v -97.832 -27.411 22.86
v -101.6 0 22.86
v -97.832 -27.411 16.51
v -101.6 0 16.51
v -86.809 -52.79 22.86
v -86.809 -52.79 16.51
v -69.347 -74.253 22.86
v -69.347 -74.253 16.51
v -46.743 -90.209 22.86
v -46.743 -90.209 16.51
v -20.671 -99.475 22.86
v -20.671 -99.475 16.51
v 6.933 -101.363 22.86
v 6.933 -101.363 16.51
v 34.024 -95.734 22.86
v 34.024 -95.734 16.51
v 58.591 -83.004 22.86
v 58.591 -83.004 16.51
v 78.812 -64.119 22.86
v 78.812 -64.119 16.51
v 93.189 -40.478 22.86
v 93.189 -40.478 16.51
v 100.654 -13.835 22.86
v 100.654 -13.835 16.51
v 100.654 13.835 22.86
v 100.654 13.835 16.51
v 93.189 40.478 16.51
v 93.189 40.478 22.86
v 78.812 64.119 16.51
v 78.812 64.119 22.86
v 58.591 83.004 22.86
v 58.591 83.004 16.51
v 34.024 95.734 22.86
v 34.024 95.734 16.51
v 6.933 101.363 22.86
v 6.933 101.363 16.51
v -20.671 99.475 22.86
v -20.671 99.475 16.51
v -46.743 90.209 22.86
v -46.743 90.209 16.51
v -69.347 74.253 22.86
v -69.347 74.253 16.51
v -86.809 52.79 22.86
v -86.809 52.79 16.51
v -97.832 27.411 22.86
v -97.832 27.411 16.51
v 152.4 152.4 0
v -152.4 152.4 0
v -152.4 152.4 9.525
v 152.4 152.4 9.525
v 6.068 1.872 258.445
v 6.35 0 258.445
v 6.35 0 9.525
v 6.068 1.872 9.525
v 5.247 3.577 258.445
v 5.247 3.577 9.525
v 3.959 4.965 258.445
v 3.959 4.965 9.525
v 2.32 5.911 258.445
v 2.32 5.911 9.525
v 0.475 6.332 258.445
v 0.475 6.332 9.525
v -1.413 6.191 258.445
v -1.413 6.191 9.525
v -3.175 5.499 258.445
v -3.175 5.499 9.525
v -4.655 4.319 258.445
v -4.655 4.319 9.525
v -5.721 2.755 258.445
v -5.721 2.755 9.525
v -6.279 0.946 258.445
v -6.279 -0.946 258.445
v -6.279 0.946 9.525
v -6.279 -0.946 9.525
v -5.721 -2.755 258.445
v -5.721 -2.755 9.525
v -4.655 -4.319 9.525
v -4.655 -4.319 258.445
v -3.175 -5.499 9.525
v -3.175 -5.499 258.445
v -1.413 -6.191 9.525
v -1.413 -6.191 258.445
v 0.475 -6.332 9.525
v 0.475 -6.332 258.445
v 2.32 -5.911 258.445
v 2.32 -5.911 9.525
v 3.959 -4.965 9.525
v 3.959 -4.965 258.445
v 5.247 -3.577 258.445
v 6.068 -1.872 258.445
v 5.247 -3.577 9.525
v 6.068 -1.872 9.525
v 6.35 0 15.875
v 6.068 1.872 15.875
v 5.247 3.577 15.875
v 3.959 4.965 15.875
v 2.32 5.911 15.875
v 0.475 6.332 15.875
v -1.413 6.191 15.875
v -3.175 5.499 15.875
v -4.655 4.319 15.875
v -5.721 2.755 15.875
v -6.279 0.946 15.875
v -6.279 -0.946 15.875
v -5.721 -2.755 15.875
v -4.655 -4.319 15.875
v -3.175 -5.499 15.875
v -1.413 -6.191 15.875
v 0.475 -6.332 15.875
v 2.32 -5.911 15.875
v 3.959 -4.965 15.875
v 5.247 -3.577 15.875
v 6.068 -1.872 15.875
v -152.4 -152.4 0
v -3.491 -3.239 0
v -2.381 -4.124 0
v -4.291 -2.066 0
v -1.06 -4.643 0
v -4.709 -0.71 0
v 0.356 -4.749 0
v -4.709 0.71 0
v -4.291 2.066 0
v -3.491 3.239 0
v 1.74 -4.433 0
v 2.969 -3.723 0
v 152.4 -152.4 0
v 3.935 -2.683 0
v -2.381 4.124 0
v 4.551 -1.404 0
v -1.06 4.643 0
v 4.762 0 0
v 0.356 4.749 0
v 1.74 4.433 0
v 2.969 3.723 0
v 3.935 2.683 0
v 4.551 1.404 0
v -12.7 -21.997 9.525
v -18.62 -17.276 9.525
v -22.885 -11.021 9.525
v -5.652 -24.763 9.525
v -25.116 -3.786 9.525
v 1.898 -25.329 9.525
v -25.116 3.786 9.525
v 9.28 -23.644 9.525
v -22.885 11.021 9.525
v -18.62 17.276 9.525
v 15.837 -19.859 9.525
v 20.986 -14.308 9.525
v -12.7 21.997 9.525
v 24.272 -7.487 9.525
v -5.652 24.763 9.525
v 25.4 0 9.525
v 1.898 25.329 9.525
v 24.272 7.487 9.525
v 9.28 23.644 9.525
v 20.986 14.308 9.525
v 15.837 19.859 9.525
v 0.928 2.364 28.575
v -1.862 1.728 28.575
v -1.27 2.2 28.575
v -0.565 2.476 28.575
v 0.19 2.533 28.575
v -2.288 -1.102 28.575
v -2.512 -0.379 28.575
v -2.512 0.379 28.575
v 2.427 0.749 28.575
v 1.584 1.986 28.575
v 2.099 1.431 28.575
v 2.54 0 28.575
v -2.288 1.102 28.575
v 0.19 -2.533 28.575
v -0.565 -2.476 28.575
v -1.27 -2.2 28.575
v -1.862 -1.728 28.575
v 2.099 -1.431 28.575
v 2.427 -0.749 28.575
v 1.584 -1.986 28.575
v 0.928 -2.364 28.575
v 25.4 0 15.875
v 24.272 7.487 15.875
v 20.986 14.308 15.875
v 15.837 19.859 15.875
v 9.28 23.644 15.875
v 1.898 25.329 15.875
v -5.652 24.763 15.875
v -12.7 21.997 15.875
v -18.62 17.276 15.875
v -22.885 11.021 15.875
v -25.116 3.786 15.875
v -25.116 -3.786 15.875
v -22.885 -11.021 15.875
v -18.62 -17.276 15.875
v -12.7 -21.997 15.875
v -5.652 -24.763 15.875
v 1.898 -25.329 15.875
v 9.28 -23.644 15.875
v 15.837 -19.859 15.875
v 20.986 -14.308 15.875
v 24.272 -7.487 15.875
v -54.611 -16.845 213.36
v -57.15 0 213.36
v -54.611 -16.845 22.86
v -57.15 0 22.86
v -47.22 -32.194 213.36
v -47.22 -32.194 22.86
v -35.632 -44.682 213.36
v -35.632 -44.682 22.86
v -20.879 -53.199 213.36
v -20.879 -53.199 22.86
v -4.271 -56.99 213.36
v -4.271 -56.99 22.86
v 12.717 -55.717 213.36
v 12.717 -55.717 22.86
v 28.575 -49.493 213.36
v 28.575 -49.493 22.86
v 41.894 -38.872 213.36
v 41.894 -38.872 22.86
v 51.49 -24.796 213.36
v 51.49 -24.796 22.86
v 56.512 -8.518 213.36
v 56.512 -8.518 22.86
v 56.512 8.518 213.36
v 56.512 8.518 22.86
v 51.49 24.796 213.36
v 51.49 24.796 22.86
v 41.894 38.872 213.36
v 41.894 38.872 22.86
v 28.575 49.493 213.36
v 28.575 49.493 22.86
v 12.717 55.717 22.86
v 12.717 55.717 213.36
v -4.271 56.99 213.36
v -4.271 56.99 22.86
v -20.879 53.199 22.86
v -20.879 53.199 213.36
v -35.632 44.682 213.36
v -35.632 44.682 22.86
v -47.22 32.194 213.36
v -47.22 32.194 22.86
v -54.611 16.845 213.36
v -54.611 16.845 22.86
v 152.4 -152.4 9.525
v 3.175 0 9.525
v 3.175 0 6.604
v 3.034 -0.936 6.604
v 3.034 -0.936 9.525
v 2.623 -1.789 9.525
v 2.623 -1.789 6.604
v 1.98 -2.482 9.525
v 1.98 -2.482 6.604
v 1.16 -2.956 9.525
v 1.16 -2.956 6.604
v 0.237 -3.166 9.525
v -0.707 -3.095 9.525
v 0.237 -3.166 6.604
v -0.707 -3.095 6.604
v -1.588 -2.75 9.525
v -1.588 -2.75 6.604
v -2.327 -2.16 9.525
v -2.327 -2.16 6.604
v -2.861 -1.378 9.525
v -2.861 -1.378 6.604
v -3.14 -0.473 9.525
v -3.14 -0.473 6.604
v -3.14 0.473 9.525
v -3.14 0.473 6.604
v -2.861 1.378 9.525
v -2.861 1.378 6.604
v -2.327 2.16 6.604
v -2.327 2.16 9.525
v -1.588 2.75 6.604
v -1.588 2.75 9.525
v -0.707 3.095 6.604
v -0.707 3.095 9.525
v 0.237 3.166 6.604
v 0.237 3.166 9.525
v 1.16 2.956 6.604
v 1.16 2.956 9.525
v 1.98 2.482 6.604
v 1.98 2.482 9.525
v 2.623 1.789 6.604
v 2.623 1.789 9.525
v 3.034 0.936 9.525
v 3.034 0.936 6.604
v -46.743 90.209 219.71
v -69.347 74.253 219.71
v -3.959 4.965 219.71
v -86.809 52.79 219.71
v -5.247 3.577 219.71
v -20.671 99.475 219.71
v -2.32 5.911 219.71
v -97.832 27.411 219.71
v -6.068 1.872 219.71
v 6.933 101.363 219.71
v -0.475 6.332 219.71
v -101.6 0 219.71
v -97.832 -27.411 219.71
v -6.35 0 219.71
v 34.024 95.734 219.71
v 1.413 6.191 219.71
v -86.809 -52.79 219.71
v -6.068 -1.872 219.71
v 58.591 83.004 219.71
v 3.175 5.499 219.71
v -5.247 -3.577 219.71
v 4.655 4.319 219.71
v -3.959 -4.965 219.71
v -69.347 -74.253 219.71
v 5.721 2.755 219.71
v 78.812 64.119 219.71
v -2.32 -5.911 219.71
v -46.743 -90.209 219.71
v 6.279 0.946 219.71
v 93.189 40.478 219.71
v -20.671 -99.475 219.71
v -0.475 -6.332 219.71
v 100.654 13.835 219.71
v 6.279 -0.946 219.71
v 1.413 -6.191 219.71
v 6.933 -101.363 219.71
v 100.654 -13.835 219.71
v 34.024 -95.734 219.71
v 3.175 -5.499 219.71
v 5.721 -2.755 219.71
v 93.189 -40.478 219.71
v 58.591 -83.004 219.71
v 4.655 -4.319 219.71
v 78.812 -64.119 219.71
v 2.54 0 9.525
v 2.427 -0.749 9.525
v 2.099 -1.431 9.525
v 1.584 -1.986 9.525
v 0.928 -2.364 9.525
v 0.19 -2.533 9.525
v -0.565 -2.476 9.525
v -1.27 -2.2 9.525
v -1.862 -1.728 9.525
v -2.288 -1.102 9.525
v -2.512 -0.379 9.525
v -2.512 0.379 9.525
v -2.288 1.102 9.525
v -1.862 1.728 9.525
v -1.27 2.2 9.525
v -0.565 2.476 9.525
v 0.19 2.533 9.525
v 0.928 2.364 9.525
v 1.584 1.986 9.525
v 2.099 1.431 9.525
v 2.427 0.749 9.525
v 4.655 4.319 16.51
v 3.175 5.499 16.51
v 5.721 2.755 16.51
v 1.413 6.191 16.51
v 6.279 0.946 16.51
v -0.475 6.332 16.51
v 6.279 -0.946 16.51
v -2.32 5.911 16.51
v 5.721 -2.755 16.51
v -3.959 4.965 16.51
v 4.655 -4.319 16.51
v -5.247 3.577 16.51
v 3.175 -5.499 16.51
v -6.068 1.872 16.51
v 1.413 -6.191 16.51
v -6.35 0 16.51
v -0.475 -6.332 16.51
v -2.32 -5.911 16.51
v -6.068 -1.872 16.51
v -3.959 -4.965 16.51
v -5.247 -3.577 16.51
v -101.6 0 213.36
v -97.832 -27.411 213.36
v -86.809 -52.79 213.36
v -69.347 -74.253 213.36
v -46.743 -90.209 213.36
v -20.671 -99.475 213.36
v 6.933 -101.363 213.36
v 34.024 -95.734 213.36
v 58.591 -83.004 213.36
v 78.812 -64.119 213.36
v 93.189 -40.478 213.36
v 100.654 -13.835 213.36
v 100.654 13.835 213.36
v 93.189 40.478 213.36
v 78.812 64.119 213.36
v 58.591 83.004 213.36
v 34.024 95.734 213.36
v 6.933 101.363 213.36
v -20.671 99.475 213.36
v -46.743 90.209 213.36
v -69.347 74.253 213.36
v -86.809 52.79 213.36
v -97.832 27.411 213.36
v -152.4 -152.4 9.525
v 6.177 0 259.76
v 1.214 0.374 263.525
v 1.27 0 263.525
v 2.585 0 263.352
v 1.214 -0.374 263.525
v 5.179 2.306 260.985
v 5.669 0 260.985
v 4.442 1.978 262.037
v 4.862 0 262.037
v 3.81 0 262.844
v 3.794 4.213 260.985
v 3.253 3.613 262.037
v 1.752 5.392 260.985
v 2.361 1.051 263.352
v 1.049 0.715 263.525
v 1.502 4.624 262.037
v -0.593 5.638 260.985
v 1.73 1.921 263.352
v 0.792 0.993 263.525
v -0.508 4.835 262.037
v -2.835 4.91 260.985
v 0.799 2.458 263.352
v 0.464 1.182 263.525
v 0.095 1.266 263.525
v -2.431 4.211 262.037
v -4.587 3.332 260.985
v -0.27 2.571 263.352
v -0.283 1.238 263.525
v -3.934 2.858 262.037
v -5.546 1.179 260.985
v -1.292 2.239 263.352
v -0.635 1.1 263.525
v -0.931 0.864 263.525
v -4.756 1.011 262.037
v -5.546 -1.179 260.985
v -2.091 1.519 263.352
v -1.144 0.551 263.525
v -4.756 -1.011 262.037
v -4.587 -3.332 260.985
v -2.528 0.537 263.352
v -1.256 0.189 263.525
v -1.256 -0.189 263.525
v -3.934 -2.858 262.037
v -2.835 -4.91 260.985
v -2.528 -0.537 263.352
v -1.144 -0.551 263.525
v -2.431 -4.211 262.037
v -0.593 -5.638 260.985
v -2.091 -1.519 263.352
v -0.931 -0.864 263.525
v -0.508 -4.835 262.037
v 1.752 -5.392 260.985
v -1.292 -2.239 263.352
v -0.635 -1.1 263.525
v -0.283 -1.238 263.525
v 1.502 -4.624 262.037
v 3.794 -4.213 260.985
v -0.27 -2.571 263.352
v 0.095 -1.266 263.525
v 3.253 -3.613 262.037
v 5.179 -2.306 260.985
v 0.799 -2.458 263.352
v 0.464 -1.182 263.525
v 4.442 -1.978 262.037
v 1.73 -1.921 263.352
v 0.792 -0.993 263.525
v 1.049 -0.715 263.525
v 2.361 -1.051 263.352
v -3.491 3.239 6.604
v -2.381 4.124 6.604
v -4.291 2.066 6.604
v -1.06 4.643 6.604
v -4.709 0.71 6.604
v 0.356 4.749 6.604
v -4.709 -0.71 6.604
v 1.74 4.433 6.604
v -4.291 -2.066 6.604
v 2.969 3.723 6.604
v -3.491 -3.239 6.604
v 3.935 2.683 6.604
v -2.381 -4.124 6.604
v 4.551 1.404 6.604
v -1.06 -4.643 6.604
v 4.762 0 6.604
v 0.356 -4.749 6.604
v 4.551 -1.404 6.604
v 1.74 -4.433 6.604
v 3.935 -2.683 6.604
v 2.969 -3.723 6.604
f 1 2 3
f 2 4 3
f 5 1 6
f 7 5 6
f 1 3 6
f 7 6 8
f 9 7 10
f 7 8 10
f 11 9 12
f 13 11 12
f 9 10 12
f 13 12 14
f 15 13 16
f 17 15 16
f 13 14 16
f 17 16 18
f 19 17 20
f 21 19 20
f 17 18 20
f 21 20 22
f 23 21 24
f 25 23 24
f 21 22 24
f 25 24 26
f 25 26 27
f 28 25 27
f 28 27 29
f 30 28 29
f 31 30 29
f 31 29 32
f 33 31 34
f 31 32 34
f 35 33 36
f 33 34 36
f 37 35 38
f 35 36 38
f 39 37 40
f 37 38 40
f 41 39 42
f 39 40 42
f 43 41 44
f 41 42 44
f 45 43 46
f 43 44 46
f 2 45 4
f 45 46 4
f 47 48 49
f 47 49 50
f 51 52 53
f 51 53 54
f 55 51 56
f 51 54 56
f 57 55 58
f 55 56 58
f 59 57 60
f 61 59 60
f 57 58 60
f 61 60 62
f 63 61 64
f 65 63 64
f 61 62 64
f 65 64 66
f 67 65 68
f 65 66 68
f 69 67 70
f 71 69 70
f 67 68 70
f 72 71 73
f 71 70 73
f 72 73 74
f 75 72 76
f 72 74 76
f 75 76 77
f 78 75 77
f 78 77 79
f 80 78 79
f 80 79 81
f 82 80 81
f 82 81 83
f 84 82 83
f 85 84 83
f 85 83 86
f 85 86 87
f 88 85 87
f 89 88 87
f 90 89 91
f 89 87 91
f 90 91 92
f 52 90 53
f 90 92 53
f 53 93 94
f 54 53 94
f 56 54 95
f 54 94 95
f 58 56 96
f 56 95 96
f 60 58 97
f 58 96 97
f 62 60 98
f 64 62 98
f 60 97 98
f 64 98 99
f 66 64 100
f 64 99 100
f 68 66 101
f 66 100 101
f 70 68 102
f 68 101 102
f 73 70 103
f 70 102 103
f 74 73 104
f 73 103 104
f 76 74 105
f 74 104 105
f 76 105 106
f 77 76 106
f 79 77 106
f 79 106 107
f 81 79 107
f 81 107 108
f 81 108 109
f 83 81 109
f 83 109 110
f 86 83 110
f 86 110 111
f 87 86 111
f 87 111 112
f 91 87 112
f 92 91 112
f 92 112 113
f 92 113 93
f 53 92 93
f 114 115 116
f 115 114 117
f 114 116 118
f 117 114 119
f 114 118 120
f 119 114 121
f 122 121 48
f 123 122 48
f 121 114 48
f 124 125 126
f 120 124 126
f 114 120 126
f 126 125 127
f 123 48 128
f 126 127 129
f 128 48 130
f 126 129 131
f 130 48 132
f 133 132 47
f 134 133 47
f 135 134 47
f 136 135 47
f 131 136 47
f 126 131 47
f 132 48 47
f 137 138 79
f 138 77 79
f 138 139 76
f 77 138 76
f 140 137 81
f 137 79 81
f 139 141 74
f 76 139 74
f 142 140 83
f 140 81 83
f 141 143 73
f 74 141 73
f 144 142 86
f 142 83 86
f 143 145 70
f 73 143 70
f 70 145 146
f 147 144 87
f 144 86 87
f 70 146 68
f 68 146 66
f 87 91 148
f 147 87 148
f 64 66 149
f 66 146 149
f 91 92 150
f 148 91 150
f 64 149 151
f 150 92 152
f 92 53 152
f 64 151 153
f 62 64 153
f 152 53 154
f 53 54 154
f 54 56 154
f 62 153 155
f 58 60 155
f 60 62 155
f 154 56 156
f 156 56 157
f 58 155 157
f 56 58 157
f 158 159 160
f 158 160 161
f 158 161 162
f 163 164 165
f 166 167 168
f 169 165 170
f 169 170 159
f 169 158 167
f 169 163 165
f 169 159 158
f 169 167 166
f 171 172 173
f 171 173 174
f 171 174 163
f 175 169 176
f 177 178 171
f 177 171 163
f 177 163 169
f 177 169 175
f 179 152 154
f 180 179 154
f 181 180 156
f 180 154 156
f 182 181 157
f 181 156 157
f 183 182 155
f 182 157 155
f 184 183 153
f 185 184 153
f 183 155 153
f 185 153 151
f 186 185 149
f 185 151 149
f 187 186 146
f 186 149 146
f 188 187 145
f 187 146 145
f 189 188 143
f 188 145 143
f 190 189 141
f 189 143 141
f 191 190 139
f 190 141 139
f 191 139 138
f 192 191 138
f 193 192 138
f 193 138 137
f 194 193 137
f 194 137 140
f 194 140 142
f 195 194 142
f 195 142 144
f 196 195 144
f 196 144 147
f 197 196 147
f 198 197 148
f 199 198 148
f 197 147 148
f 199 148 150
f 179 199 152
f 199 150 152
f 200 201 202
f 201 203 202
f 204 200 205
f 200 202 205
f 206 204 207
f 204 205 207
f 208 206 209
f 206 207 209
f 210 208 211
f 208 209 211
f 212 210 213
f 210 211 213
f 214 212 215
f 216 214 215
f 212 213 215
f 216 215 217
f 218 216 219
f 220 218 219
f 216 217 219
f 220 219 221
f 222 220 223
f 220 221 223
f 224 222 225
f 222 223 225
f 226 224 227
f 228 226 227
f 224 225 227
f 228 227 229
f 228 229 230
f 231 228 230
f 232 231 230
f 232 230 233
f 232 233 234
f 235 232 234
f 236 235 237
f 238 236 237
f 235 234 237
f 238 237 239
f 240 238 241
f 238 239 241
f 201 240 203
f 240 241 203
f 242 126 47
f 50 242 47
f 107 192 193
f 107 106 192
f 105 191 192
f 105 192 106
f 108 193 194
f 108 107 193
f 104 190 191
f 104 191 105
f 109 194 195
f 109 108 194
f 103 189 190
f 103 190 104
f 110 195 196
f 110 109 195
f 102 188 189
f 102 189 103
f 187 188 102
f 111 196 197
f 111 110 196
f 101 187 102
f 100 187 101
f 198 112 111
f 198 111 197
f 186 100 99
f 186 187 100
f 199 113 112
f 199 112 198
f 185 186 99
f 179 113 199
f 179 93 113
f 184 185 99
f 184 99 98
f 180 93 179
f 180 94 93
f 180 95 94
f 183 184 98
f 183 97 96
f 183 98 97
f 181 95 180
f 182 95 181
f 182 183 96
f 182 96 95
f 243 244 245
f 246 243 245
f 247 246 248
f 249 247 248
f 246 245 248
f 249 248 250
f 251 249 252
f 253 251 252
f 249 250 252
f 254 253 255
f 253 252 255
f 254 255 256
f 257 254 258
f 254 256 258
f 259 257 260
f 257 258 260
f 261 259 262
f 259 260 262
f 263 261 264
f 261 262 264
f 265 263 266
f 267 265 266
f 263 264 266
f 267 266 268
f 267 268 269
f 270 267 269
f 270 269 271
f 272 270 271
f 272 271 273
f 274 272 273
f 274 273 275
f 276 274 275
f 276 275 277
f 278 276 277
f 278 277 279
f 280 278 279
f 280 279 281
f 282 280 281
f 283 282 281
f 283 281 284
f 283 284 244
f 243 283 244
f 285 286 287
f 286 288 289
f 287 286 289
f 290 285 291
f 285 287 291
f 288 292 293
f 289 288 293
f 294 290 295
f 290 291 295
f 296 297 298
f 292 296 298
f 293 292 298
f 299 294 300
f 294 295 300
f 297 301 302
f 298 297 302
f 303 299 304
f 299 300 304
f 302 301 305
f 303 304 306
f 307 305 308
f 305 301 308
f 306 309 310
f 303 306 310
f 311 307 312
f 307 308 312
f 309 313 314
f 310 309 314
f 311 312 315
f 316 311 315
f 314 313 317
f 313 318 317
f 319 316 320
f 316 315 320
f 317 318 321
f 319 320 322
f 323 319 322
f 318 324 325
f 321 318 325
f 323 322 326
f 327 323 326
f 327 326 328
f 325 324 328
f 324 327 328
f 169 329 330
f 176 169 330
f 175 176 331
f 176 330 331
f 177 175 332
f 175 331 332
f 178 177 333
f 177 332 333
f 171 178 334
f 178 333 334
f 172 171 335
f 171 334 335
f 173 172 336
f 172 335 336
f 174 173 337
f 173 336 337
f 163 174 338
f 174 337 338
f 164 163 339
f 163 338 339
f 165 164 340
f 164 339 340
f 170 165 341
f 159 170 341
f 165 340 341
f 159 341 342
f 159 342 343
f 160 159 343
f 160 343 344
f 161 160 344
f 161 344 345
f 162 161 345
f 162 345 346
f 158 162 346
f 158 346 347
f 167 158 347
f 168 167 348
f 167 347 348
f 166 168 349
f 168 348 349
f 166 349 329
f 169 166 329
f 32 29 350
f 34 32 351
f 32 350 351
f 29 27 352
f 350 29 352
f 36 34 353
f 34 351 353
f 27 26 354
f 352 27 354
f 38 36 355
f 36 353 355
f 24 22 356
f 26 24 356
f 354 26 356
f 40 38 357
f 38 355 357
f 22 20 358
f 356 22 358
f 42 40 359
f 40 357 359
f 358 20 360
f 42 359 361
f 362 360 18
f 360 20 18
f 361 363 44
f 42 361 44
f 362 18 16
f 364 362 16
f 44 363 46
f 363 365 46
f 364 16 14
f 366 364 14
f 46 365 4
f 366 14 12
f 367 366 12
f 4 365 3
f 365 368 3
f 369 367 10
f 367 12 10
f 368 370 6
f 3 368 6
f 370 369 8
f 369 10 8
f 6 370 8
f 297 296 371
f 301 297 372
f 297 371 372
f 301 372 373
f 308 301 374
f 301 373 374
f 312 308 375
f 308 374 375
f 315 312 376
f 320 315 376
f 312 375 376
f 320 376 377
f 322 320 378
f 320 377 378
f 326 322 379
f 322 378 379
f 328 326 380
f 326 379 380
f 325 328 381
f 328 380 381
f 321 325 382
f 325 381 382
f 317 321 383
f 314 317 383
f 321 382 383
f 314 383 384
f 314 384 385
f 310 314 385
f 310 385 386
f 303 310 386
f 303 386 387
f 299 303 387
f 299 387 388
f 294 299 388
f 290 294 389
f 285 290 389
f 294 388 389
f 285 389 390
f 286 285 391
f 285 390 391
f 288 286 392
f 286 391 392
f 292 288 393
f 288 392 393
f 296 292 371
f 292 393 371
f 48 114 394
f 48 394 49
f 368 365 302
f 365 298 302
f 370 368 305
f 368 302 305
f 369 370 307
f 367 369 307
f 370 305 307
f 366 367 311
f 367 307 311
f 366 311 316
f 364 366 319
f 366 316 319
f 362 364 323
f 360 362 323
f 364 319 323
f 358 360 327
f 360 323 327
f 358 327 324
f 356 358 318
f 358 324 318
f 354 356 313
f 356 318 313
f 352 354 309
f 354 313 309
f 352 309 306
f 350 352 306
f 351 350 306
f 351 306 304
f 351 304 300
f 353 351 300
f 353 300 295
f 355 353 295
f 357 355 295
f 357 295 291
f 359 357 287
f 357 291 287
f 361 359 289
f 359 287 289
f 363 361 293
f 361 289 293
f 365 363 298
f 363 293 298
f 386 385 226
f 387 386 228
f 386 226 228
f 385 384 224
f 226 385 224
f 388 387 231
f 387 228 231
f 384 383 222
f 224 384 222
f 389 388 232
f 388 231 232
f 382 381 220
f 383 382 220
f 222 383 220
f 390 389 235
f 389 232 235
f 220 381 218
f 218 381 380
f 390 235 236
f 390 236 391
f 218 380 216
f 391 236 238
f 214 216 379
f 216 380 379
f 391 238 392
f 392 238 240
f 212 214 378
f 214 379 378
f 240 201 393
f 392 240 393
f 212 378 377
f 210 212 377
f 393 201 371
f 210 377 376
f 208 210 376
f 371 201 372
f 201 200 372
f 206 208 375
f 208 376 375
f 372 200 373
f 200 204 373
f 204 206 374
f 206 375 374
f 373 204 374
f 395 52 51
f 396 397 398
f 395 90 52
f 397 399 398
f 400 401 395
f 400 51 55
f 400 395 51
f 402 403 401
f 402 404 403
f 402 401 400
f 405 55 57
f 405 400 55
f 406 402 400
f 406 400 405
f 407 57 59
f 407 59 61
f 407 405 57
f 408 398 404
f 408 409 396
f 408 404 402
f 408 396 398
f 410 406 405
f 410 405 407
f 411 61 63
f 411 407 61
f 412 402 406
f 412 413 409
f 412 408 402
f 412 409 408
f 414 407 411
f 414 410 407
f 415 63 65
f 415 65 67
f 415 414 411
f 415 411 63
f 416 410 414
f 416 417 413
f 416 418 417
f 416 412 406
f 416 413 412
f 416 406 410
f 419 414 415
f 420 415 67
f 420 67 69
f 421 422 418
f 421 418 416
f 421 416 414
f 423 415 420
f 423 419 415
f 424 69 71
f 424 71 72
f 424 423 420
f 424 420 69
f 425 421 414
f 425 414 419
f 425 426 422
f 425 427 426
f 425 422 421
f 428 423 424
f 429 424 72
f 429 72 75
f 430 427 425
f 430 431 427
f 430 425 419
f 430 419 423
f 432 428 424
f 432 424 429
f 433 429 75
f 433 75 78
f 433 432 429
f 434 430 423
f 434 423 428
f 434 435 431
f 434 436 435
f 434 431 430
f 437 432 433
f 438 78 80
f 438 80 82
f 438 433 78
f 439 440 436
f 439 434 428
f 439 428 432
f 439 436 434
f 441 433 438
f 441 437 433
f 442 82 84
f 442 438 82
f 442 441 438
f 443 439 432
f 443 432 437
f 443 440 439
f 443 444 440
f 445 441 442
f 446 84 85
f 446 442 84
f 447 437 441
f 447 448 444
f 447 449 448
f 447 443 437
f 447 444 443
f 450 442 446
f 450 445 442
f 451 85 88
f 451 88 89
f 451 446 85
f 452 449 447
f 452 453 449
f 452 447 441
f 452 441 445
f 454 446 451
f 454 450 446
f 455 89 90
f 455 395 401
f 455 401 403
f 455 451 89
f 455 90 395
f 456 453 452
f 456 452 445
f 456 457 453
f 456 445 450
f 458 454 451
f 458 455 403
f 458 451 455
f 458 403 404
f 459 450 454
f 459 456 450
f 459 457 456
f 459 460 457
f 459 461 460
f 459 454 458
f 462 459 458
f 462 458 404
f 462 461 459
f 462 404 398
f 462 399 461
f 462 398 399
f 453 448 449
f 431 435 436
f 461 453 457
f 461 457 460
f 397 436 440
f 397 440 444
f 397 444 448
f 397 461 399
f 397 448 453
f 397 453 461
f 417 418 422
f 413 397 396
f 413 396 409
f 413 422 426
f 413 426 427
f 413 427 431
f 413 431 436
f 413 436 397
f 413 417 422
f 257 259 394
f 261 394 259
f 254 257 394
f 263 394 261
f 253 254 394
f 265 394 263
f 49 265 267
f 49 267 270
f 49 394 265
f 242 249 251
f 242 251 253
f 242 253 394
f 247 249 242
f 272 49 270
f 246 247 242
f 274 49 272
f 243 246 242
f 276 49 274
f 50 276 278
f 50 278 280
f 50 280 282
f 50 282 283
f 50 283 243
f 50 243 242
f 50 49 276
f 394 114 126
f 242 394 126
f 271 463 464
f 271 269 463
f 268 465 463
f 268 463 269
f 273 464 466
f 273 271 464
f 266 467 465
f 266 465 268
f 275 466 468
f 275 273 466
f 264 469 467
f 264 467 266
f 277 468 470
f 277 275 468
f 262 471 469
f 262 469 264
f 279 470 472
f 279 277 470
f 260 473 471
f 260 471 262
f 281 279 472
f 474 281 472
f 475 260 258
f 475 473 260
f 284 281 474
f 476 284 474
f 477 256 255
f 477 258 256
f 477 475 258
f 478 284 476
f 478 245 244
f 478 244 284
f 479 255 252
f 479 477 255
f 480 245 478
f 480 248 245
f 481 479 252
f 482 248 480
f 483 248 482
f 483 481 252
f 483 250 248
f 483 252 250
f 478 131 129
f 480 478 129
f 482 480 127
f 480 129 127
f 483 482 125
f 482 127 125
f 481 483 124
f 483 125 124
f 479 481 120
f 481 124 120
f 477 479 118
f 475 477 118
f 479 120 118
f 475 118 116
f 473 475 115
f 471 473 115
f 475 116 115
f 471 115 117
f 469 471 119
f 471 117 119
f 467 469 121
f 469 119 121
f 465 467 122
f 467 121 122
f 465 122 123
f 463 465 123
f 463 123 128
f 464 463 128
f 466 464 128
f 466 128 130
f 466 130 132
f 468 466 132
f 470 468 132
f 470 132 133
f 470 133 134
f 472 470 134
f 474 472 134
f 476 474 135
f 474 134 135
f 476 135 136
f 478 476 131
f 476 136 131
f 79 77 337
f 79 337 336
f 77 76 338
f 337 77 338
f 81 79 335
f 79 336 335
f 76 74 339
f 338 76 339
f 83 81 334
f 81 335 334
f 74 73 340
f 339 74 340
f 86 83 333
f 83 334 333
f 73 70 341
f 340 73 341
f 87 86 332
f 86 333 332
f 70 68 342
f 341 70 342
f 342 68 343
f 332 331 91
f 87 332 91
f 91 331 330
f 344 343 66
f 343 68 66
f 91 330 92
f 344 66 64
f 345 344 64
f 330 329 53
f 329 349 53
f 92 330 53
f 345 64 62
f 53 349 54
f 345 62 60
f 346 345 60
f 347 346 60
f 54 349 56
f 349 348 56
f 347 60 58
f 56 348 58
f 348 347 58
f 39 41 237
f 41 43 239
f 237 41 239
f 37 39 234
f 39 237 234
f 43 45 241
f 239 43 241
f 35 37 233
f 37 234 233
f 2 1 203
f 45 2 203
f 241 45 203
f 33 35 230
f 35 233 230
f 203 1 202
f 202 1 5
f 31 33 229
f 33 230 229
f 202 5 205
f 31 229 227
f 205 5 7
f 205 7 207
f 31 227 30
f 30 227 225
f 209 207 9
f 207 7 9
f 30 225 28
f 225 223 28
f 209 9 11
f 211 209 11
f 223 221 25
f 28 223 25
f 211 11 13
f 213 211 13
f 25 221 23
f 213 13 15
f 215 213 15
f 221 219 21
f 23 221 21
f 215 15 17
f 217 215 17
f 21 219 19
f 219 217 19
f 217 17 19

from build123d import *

# Parameters (mm, degrees)
F0_W      = 304.8
F0_H      = 304.8
F1_DEPTH  = 9.525
F2_R      = 25.4
F3_DEPTH  = 6.35
F4_R      = 6.35
F5_DEPTH  = 15.876
F6_R      = 6.35
F7_DEPTH  = 254
F8_R      = 5.08
F9_R      = 3.175
F10_DEPTH = 263.526
F11_R     = 4.7625
F12_DEPTH = 6.604
F13_R     = 2.54
F14_DEPTH = 19.05


with BuildPart() as f1:
    # F0 (on Top) → F1 (new body)
    with BuildSketch(Plane.XY):
        Rectangle(F0_W, F0_H)
    extrude(amount=F1_DEPTH)

    # F9 (on face) → F10 (cut, through all)
    with BuildSketch(Plane(origin=(0, 0, 0), x_dir=(1, 0, 0), z_dir=(0, 0, -1))):
        Circle(F9_R)
    extrude(amount=-F10_DEPTH, mode=Mode.SUBTRACT)

    # F11 (on face) → F12 (cut)
    with BuildSketch(Plane(origin=(0, 0, 0), x_dir=(1, 0, 0), z_dir=(0, 0, -1))):
        Circle(F11_R)
    extrude(amount=-F12_DEPTH, mode=Mode.SUBTRACT)


with BuildPart() as f3:
    # F2 (on face) → F3 (new body)
    with BuildSketch(Plane.XY.offset(9.525)):
        Circle(F2_R)
    extrude(amount=F3_DEPTH)

    # F4 (on face) → F5 (cut, through all)
    with BuildSketch(Plane.XY.offset(15.875)):
        Circle(F4_R)
    extrude(amount=-F5_DEPTH, mode=Mode.SUBTRACT)


with BuildPart() as f7:
    # F6 (on face) → F7 (new body)
    with BuildSketch(Plane.XY.offset(9.525)):
        Circle(F6_R)
    extrude(amount=F7_DEPTH)

    # F8
    f8_edges = [f7.edges().sort_by_distance(p)[0] for p in [
        (-6.35, 0, 263.525),
    ]]
    fillet(f8_edges, radius=F8_R)

    # F13 (on face) → F14 (cut)
    with BuildSketch(Plane(origin=(0, 0, 9.525), x_dir=(1, 0, 0), z_dir=(0, 0, -1))):
        Circle(F13_R)
    extrude(amount=-F14_DEPTH, mode=Mode.SUBTRACT)


with BuildPart() as f16:
    # F15 (on Front) → F16 (revolve)
    with BuildSketch(Plane.XZ):
        Polygon((-101.6, 16.51), (-6.35, 16.51), (-6.35, 219.71), (-101.6, 219.71), (-101.6, 213.36), (-57.15, 213.36), (-57.15, 22.86), (-101.6, 22.86), align=None)
    revolve(axis=Axis((0, 0, 128.212804722), (0, 0, 1)))


solid = Compound([f1.part, f3.part, f7.part, f16.part])
